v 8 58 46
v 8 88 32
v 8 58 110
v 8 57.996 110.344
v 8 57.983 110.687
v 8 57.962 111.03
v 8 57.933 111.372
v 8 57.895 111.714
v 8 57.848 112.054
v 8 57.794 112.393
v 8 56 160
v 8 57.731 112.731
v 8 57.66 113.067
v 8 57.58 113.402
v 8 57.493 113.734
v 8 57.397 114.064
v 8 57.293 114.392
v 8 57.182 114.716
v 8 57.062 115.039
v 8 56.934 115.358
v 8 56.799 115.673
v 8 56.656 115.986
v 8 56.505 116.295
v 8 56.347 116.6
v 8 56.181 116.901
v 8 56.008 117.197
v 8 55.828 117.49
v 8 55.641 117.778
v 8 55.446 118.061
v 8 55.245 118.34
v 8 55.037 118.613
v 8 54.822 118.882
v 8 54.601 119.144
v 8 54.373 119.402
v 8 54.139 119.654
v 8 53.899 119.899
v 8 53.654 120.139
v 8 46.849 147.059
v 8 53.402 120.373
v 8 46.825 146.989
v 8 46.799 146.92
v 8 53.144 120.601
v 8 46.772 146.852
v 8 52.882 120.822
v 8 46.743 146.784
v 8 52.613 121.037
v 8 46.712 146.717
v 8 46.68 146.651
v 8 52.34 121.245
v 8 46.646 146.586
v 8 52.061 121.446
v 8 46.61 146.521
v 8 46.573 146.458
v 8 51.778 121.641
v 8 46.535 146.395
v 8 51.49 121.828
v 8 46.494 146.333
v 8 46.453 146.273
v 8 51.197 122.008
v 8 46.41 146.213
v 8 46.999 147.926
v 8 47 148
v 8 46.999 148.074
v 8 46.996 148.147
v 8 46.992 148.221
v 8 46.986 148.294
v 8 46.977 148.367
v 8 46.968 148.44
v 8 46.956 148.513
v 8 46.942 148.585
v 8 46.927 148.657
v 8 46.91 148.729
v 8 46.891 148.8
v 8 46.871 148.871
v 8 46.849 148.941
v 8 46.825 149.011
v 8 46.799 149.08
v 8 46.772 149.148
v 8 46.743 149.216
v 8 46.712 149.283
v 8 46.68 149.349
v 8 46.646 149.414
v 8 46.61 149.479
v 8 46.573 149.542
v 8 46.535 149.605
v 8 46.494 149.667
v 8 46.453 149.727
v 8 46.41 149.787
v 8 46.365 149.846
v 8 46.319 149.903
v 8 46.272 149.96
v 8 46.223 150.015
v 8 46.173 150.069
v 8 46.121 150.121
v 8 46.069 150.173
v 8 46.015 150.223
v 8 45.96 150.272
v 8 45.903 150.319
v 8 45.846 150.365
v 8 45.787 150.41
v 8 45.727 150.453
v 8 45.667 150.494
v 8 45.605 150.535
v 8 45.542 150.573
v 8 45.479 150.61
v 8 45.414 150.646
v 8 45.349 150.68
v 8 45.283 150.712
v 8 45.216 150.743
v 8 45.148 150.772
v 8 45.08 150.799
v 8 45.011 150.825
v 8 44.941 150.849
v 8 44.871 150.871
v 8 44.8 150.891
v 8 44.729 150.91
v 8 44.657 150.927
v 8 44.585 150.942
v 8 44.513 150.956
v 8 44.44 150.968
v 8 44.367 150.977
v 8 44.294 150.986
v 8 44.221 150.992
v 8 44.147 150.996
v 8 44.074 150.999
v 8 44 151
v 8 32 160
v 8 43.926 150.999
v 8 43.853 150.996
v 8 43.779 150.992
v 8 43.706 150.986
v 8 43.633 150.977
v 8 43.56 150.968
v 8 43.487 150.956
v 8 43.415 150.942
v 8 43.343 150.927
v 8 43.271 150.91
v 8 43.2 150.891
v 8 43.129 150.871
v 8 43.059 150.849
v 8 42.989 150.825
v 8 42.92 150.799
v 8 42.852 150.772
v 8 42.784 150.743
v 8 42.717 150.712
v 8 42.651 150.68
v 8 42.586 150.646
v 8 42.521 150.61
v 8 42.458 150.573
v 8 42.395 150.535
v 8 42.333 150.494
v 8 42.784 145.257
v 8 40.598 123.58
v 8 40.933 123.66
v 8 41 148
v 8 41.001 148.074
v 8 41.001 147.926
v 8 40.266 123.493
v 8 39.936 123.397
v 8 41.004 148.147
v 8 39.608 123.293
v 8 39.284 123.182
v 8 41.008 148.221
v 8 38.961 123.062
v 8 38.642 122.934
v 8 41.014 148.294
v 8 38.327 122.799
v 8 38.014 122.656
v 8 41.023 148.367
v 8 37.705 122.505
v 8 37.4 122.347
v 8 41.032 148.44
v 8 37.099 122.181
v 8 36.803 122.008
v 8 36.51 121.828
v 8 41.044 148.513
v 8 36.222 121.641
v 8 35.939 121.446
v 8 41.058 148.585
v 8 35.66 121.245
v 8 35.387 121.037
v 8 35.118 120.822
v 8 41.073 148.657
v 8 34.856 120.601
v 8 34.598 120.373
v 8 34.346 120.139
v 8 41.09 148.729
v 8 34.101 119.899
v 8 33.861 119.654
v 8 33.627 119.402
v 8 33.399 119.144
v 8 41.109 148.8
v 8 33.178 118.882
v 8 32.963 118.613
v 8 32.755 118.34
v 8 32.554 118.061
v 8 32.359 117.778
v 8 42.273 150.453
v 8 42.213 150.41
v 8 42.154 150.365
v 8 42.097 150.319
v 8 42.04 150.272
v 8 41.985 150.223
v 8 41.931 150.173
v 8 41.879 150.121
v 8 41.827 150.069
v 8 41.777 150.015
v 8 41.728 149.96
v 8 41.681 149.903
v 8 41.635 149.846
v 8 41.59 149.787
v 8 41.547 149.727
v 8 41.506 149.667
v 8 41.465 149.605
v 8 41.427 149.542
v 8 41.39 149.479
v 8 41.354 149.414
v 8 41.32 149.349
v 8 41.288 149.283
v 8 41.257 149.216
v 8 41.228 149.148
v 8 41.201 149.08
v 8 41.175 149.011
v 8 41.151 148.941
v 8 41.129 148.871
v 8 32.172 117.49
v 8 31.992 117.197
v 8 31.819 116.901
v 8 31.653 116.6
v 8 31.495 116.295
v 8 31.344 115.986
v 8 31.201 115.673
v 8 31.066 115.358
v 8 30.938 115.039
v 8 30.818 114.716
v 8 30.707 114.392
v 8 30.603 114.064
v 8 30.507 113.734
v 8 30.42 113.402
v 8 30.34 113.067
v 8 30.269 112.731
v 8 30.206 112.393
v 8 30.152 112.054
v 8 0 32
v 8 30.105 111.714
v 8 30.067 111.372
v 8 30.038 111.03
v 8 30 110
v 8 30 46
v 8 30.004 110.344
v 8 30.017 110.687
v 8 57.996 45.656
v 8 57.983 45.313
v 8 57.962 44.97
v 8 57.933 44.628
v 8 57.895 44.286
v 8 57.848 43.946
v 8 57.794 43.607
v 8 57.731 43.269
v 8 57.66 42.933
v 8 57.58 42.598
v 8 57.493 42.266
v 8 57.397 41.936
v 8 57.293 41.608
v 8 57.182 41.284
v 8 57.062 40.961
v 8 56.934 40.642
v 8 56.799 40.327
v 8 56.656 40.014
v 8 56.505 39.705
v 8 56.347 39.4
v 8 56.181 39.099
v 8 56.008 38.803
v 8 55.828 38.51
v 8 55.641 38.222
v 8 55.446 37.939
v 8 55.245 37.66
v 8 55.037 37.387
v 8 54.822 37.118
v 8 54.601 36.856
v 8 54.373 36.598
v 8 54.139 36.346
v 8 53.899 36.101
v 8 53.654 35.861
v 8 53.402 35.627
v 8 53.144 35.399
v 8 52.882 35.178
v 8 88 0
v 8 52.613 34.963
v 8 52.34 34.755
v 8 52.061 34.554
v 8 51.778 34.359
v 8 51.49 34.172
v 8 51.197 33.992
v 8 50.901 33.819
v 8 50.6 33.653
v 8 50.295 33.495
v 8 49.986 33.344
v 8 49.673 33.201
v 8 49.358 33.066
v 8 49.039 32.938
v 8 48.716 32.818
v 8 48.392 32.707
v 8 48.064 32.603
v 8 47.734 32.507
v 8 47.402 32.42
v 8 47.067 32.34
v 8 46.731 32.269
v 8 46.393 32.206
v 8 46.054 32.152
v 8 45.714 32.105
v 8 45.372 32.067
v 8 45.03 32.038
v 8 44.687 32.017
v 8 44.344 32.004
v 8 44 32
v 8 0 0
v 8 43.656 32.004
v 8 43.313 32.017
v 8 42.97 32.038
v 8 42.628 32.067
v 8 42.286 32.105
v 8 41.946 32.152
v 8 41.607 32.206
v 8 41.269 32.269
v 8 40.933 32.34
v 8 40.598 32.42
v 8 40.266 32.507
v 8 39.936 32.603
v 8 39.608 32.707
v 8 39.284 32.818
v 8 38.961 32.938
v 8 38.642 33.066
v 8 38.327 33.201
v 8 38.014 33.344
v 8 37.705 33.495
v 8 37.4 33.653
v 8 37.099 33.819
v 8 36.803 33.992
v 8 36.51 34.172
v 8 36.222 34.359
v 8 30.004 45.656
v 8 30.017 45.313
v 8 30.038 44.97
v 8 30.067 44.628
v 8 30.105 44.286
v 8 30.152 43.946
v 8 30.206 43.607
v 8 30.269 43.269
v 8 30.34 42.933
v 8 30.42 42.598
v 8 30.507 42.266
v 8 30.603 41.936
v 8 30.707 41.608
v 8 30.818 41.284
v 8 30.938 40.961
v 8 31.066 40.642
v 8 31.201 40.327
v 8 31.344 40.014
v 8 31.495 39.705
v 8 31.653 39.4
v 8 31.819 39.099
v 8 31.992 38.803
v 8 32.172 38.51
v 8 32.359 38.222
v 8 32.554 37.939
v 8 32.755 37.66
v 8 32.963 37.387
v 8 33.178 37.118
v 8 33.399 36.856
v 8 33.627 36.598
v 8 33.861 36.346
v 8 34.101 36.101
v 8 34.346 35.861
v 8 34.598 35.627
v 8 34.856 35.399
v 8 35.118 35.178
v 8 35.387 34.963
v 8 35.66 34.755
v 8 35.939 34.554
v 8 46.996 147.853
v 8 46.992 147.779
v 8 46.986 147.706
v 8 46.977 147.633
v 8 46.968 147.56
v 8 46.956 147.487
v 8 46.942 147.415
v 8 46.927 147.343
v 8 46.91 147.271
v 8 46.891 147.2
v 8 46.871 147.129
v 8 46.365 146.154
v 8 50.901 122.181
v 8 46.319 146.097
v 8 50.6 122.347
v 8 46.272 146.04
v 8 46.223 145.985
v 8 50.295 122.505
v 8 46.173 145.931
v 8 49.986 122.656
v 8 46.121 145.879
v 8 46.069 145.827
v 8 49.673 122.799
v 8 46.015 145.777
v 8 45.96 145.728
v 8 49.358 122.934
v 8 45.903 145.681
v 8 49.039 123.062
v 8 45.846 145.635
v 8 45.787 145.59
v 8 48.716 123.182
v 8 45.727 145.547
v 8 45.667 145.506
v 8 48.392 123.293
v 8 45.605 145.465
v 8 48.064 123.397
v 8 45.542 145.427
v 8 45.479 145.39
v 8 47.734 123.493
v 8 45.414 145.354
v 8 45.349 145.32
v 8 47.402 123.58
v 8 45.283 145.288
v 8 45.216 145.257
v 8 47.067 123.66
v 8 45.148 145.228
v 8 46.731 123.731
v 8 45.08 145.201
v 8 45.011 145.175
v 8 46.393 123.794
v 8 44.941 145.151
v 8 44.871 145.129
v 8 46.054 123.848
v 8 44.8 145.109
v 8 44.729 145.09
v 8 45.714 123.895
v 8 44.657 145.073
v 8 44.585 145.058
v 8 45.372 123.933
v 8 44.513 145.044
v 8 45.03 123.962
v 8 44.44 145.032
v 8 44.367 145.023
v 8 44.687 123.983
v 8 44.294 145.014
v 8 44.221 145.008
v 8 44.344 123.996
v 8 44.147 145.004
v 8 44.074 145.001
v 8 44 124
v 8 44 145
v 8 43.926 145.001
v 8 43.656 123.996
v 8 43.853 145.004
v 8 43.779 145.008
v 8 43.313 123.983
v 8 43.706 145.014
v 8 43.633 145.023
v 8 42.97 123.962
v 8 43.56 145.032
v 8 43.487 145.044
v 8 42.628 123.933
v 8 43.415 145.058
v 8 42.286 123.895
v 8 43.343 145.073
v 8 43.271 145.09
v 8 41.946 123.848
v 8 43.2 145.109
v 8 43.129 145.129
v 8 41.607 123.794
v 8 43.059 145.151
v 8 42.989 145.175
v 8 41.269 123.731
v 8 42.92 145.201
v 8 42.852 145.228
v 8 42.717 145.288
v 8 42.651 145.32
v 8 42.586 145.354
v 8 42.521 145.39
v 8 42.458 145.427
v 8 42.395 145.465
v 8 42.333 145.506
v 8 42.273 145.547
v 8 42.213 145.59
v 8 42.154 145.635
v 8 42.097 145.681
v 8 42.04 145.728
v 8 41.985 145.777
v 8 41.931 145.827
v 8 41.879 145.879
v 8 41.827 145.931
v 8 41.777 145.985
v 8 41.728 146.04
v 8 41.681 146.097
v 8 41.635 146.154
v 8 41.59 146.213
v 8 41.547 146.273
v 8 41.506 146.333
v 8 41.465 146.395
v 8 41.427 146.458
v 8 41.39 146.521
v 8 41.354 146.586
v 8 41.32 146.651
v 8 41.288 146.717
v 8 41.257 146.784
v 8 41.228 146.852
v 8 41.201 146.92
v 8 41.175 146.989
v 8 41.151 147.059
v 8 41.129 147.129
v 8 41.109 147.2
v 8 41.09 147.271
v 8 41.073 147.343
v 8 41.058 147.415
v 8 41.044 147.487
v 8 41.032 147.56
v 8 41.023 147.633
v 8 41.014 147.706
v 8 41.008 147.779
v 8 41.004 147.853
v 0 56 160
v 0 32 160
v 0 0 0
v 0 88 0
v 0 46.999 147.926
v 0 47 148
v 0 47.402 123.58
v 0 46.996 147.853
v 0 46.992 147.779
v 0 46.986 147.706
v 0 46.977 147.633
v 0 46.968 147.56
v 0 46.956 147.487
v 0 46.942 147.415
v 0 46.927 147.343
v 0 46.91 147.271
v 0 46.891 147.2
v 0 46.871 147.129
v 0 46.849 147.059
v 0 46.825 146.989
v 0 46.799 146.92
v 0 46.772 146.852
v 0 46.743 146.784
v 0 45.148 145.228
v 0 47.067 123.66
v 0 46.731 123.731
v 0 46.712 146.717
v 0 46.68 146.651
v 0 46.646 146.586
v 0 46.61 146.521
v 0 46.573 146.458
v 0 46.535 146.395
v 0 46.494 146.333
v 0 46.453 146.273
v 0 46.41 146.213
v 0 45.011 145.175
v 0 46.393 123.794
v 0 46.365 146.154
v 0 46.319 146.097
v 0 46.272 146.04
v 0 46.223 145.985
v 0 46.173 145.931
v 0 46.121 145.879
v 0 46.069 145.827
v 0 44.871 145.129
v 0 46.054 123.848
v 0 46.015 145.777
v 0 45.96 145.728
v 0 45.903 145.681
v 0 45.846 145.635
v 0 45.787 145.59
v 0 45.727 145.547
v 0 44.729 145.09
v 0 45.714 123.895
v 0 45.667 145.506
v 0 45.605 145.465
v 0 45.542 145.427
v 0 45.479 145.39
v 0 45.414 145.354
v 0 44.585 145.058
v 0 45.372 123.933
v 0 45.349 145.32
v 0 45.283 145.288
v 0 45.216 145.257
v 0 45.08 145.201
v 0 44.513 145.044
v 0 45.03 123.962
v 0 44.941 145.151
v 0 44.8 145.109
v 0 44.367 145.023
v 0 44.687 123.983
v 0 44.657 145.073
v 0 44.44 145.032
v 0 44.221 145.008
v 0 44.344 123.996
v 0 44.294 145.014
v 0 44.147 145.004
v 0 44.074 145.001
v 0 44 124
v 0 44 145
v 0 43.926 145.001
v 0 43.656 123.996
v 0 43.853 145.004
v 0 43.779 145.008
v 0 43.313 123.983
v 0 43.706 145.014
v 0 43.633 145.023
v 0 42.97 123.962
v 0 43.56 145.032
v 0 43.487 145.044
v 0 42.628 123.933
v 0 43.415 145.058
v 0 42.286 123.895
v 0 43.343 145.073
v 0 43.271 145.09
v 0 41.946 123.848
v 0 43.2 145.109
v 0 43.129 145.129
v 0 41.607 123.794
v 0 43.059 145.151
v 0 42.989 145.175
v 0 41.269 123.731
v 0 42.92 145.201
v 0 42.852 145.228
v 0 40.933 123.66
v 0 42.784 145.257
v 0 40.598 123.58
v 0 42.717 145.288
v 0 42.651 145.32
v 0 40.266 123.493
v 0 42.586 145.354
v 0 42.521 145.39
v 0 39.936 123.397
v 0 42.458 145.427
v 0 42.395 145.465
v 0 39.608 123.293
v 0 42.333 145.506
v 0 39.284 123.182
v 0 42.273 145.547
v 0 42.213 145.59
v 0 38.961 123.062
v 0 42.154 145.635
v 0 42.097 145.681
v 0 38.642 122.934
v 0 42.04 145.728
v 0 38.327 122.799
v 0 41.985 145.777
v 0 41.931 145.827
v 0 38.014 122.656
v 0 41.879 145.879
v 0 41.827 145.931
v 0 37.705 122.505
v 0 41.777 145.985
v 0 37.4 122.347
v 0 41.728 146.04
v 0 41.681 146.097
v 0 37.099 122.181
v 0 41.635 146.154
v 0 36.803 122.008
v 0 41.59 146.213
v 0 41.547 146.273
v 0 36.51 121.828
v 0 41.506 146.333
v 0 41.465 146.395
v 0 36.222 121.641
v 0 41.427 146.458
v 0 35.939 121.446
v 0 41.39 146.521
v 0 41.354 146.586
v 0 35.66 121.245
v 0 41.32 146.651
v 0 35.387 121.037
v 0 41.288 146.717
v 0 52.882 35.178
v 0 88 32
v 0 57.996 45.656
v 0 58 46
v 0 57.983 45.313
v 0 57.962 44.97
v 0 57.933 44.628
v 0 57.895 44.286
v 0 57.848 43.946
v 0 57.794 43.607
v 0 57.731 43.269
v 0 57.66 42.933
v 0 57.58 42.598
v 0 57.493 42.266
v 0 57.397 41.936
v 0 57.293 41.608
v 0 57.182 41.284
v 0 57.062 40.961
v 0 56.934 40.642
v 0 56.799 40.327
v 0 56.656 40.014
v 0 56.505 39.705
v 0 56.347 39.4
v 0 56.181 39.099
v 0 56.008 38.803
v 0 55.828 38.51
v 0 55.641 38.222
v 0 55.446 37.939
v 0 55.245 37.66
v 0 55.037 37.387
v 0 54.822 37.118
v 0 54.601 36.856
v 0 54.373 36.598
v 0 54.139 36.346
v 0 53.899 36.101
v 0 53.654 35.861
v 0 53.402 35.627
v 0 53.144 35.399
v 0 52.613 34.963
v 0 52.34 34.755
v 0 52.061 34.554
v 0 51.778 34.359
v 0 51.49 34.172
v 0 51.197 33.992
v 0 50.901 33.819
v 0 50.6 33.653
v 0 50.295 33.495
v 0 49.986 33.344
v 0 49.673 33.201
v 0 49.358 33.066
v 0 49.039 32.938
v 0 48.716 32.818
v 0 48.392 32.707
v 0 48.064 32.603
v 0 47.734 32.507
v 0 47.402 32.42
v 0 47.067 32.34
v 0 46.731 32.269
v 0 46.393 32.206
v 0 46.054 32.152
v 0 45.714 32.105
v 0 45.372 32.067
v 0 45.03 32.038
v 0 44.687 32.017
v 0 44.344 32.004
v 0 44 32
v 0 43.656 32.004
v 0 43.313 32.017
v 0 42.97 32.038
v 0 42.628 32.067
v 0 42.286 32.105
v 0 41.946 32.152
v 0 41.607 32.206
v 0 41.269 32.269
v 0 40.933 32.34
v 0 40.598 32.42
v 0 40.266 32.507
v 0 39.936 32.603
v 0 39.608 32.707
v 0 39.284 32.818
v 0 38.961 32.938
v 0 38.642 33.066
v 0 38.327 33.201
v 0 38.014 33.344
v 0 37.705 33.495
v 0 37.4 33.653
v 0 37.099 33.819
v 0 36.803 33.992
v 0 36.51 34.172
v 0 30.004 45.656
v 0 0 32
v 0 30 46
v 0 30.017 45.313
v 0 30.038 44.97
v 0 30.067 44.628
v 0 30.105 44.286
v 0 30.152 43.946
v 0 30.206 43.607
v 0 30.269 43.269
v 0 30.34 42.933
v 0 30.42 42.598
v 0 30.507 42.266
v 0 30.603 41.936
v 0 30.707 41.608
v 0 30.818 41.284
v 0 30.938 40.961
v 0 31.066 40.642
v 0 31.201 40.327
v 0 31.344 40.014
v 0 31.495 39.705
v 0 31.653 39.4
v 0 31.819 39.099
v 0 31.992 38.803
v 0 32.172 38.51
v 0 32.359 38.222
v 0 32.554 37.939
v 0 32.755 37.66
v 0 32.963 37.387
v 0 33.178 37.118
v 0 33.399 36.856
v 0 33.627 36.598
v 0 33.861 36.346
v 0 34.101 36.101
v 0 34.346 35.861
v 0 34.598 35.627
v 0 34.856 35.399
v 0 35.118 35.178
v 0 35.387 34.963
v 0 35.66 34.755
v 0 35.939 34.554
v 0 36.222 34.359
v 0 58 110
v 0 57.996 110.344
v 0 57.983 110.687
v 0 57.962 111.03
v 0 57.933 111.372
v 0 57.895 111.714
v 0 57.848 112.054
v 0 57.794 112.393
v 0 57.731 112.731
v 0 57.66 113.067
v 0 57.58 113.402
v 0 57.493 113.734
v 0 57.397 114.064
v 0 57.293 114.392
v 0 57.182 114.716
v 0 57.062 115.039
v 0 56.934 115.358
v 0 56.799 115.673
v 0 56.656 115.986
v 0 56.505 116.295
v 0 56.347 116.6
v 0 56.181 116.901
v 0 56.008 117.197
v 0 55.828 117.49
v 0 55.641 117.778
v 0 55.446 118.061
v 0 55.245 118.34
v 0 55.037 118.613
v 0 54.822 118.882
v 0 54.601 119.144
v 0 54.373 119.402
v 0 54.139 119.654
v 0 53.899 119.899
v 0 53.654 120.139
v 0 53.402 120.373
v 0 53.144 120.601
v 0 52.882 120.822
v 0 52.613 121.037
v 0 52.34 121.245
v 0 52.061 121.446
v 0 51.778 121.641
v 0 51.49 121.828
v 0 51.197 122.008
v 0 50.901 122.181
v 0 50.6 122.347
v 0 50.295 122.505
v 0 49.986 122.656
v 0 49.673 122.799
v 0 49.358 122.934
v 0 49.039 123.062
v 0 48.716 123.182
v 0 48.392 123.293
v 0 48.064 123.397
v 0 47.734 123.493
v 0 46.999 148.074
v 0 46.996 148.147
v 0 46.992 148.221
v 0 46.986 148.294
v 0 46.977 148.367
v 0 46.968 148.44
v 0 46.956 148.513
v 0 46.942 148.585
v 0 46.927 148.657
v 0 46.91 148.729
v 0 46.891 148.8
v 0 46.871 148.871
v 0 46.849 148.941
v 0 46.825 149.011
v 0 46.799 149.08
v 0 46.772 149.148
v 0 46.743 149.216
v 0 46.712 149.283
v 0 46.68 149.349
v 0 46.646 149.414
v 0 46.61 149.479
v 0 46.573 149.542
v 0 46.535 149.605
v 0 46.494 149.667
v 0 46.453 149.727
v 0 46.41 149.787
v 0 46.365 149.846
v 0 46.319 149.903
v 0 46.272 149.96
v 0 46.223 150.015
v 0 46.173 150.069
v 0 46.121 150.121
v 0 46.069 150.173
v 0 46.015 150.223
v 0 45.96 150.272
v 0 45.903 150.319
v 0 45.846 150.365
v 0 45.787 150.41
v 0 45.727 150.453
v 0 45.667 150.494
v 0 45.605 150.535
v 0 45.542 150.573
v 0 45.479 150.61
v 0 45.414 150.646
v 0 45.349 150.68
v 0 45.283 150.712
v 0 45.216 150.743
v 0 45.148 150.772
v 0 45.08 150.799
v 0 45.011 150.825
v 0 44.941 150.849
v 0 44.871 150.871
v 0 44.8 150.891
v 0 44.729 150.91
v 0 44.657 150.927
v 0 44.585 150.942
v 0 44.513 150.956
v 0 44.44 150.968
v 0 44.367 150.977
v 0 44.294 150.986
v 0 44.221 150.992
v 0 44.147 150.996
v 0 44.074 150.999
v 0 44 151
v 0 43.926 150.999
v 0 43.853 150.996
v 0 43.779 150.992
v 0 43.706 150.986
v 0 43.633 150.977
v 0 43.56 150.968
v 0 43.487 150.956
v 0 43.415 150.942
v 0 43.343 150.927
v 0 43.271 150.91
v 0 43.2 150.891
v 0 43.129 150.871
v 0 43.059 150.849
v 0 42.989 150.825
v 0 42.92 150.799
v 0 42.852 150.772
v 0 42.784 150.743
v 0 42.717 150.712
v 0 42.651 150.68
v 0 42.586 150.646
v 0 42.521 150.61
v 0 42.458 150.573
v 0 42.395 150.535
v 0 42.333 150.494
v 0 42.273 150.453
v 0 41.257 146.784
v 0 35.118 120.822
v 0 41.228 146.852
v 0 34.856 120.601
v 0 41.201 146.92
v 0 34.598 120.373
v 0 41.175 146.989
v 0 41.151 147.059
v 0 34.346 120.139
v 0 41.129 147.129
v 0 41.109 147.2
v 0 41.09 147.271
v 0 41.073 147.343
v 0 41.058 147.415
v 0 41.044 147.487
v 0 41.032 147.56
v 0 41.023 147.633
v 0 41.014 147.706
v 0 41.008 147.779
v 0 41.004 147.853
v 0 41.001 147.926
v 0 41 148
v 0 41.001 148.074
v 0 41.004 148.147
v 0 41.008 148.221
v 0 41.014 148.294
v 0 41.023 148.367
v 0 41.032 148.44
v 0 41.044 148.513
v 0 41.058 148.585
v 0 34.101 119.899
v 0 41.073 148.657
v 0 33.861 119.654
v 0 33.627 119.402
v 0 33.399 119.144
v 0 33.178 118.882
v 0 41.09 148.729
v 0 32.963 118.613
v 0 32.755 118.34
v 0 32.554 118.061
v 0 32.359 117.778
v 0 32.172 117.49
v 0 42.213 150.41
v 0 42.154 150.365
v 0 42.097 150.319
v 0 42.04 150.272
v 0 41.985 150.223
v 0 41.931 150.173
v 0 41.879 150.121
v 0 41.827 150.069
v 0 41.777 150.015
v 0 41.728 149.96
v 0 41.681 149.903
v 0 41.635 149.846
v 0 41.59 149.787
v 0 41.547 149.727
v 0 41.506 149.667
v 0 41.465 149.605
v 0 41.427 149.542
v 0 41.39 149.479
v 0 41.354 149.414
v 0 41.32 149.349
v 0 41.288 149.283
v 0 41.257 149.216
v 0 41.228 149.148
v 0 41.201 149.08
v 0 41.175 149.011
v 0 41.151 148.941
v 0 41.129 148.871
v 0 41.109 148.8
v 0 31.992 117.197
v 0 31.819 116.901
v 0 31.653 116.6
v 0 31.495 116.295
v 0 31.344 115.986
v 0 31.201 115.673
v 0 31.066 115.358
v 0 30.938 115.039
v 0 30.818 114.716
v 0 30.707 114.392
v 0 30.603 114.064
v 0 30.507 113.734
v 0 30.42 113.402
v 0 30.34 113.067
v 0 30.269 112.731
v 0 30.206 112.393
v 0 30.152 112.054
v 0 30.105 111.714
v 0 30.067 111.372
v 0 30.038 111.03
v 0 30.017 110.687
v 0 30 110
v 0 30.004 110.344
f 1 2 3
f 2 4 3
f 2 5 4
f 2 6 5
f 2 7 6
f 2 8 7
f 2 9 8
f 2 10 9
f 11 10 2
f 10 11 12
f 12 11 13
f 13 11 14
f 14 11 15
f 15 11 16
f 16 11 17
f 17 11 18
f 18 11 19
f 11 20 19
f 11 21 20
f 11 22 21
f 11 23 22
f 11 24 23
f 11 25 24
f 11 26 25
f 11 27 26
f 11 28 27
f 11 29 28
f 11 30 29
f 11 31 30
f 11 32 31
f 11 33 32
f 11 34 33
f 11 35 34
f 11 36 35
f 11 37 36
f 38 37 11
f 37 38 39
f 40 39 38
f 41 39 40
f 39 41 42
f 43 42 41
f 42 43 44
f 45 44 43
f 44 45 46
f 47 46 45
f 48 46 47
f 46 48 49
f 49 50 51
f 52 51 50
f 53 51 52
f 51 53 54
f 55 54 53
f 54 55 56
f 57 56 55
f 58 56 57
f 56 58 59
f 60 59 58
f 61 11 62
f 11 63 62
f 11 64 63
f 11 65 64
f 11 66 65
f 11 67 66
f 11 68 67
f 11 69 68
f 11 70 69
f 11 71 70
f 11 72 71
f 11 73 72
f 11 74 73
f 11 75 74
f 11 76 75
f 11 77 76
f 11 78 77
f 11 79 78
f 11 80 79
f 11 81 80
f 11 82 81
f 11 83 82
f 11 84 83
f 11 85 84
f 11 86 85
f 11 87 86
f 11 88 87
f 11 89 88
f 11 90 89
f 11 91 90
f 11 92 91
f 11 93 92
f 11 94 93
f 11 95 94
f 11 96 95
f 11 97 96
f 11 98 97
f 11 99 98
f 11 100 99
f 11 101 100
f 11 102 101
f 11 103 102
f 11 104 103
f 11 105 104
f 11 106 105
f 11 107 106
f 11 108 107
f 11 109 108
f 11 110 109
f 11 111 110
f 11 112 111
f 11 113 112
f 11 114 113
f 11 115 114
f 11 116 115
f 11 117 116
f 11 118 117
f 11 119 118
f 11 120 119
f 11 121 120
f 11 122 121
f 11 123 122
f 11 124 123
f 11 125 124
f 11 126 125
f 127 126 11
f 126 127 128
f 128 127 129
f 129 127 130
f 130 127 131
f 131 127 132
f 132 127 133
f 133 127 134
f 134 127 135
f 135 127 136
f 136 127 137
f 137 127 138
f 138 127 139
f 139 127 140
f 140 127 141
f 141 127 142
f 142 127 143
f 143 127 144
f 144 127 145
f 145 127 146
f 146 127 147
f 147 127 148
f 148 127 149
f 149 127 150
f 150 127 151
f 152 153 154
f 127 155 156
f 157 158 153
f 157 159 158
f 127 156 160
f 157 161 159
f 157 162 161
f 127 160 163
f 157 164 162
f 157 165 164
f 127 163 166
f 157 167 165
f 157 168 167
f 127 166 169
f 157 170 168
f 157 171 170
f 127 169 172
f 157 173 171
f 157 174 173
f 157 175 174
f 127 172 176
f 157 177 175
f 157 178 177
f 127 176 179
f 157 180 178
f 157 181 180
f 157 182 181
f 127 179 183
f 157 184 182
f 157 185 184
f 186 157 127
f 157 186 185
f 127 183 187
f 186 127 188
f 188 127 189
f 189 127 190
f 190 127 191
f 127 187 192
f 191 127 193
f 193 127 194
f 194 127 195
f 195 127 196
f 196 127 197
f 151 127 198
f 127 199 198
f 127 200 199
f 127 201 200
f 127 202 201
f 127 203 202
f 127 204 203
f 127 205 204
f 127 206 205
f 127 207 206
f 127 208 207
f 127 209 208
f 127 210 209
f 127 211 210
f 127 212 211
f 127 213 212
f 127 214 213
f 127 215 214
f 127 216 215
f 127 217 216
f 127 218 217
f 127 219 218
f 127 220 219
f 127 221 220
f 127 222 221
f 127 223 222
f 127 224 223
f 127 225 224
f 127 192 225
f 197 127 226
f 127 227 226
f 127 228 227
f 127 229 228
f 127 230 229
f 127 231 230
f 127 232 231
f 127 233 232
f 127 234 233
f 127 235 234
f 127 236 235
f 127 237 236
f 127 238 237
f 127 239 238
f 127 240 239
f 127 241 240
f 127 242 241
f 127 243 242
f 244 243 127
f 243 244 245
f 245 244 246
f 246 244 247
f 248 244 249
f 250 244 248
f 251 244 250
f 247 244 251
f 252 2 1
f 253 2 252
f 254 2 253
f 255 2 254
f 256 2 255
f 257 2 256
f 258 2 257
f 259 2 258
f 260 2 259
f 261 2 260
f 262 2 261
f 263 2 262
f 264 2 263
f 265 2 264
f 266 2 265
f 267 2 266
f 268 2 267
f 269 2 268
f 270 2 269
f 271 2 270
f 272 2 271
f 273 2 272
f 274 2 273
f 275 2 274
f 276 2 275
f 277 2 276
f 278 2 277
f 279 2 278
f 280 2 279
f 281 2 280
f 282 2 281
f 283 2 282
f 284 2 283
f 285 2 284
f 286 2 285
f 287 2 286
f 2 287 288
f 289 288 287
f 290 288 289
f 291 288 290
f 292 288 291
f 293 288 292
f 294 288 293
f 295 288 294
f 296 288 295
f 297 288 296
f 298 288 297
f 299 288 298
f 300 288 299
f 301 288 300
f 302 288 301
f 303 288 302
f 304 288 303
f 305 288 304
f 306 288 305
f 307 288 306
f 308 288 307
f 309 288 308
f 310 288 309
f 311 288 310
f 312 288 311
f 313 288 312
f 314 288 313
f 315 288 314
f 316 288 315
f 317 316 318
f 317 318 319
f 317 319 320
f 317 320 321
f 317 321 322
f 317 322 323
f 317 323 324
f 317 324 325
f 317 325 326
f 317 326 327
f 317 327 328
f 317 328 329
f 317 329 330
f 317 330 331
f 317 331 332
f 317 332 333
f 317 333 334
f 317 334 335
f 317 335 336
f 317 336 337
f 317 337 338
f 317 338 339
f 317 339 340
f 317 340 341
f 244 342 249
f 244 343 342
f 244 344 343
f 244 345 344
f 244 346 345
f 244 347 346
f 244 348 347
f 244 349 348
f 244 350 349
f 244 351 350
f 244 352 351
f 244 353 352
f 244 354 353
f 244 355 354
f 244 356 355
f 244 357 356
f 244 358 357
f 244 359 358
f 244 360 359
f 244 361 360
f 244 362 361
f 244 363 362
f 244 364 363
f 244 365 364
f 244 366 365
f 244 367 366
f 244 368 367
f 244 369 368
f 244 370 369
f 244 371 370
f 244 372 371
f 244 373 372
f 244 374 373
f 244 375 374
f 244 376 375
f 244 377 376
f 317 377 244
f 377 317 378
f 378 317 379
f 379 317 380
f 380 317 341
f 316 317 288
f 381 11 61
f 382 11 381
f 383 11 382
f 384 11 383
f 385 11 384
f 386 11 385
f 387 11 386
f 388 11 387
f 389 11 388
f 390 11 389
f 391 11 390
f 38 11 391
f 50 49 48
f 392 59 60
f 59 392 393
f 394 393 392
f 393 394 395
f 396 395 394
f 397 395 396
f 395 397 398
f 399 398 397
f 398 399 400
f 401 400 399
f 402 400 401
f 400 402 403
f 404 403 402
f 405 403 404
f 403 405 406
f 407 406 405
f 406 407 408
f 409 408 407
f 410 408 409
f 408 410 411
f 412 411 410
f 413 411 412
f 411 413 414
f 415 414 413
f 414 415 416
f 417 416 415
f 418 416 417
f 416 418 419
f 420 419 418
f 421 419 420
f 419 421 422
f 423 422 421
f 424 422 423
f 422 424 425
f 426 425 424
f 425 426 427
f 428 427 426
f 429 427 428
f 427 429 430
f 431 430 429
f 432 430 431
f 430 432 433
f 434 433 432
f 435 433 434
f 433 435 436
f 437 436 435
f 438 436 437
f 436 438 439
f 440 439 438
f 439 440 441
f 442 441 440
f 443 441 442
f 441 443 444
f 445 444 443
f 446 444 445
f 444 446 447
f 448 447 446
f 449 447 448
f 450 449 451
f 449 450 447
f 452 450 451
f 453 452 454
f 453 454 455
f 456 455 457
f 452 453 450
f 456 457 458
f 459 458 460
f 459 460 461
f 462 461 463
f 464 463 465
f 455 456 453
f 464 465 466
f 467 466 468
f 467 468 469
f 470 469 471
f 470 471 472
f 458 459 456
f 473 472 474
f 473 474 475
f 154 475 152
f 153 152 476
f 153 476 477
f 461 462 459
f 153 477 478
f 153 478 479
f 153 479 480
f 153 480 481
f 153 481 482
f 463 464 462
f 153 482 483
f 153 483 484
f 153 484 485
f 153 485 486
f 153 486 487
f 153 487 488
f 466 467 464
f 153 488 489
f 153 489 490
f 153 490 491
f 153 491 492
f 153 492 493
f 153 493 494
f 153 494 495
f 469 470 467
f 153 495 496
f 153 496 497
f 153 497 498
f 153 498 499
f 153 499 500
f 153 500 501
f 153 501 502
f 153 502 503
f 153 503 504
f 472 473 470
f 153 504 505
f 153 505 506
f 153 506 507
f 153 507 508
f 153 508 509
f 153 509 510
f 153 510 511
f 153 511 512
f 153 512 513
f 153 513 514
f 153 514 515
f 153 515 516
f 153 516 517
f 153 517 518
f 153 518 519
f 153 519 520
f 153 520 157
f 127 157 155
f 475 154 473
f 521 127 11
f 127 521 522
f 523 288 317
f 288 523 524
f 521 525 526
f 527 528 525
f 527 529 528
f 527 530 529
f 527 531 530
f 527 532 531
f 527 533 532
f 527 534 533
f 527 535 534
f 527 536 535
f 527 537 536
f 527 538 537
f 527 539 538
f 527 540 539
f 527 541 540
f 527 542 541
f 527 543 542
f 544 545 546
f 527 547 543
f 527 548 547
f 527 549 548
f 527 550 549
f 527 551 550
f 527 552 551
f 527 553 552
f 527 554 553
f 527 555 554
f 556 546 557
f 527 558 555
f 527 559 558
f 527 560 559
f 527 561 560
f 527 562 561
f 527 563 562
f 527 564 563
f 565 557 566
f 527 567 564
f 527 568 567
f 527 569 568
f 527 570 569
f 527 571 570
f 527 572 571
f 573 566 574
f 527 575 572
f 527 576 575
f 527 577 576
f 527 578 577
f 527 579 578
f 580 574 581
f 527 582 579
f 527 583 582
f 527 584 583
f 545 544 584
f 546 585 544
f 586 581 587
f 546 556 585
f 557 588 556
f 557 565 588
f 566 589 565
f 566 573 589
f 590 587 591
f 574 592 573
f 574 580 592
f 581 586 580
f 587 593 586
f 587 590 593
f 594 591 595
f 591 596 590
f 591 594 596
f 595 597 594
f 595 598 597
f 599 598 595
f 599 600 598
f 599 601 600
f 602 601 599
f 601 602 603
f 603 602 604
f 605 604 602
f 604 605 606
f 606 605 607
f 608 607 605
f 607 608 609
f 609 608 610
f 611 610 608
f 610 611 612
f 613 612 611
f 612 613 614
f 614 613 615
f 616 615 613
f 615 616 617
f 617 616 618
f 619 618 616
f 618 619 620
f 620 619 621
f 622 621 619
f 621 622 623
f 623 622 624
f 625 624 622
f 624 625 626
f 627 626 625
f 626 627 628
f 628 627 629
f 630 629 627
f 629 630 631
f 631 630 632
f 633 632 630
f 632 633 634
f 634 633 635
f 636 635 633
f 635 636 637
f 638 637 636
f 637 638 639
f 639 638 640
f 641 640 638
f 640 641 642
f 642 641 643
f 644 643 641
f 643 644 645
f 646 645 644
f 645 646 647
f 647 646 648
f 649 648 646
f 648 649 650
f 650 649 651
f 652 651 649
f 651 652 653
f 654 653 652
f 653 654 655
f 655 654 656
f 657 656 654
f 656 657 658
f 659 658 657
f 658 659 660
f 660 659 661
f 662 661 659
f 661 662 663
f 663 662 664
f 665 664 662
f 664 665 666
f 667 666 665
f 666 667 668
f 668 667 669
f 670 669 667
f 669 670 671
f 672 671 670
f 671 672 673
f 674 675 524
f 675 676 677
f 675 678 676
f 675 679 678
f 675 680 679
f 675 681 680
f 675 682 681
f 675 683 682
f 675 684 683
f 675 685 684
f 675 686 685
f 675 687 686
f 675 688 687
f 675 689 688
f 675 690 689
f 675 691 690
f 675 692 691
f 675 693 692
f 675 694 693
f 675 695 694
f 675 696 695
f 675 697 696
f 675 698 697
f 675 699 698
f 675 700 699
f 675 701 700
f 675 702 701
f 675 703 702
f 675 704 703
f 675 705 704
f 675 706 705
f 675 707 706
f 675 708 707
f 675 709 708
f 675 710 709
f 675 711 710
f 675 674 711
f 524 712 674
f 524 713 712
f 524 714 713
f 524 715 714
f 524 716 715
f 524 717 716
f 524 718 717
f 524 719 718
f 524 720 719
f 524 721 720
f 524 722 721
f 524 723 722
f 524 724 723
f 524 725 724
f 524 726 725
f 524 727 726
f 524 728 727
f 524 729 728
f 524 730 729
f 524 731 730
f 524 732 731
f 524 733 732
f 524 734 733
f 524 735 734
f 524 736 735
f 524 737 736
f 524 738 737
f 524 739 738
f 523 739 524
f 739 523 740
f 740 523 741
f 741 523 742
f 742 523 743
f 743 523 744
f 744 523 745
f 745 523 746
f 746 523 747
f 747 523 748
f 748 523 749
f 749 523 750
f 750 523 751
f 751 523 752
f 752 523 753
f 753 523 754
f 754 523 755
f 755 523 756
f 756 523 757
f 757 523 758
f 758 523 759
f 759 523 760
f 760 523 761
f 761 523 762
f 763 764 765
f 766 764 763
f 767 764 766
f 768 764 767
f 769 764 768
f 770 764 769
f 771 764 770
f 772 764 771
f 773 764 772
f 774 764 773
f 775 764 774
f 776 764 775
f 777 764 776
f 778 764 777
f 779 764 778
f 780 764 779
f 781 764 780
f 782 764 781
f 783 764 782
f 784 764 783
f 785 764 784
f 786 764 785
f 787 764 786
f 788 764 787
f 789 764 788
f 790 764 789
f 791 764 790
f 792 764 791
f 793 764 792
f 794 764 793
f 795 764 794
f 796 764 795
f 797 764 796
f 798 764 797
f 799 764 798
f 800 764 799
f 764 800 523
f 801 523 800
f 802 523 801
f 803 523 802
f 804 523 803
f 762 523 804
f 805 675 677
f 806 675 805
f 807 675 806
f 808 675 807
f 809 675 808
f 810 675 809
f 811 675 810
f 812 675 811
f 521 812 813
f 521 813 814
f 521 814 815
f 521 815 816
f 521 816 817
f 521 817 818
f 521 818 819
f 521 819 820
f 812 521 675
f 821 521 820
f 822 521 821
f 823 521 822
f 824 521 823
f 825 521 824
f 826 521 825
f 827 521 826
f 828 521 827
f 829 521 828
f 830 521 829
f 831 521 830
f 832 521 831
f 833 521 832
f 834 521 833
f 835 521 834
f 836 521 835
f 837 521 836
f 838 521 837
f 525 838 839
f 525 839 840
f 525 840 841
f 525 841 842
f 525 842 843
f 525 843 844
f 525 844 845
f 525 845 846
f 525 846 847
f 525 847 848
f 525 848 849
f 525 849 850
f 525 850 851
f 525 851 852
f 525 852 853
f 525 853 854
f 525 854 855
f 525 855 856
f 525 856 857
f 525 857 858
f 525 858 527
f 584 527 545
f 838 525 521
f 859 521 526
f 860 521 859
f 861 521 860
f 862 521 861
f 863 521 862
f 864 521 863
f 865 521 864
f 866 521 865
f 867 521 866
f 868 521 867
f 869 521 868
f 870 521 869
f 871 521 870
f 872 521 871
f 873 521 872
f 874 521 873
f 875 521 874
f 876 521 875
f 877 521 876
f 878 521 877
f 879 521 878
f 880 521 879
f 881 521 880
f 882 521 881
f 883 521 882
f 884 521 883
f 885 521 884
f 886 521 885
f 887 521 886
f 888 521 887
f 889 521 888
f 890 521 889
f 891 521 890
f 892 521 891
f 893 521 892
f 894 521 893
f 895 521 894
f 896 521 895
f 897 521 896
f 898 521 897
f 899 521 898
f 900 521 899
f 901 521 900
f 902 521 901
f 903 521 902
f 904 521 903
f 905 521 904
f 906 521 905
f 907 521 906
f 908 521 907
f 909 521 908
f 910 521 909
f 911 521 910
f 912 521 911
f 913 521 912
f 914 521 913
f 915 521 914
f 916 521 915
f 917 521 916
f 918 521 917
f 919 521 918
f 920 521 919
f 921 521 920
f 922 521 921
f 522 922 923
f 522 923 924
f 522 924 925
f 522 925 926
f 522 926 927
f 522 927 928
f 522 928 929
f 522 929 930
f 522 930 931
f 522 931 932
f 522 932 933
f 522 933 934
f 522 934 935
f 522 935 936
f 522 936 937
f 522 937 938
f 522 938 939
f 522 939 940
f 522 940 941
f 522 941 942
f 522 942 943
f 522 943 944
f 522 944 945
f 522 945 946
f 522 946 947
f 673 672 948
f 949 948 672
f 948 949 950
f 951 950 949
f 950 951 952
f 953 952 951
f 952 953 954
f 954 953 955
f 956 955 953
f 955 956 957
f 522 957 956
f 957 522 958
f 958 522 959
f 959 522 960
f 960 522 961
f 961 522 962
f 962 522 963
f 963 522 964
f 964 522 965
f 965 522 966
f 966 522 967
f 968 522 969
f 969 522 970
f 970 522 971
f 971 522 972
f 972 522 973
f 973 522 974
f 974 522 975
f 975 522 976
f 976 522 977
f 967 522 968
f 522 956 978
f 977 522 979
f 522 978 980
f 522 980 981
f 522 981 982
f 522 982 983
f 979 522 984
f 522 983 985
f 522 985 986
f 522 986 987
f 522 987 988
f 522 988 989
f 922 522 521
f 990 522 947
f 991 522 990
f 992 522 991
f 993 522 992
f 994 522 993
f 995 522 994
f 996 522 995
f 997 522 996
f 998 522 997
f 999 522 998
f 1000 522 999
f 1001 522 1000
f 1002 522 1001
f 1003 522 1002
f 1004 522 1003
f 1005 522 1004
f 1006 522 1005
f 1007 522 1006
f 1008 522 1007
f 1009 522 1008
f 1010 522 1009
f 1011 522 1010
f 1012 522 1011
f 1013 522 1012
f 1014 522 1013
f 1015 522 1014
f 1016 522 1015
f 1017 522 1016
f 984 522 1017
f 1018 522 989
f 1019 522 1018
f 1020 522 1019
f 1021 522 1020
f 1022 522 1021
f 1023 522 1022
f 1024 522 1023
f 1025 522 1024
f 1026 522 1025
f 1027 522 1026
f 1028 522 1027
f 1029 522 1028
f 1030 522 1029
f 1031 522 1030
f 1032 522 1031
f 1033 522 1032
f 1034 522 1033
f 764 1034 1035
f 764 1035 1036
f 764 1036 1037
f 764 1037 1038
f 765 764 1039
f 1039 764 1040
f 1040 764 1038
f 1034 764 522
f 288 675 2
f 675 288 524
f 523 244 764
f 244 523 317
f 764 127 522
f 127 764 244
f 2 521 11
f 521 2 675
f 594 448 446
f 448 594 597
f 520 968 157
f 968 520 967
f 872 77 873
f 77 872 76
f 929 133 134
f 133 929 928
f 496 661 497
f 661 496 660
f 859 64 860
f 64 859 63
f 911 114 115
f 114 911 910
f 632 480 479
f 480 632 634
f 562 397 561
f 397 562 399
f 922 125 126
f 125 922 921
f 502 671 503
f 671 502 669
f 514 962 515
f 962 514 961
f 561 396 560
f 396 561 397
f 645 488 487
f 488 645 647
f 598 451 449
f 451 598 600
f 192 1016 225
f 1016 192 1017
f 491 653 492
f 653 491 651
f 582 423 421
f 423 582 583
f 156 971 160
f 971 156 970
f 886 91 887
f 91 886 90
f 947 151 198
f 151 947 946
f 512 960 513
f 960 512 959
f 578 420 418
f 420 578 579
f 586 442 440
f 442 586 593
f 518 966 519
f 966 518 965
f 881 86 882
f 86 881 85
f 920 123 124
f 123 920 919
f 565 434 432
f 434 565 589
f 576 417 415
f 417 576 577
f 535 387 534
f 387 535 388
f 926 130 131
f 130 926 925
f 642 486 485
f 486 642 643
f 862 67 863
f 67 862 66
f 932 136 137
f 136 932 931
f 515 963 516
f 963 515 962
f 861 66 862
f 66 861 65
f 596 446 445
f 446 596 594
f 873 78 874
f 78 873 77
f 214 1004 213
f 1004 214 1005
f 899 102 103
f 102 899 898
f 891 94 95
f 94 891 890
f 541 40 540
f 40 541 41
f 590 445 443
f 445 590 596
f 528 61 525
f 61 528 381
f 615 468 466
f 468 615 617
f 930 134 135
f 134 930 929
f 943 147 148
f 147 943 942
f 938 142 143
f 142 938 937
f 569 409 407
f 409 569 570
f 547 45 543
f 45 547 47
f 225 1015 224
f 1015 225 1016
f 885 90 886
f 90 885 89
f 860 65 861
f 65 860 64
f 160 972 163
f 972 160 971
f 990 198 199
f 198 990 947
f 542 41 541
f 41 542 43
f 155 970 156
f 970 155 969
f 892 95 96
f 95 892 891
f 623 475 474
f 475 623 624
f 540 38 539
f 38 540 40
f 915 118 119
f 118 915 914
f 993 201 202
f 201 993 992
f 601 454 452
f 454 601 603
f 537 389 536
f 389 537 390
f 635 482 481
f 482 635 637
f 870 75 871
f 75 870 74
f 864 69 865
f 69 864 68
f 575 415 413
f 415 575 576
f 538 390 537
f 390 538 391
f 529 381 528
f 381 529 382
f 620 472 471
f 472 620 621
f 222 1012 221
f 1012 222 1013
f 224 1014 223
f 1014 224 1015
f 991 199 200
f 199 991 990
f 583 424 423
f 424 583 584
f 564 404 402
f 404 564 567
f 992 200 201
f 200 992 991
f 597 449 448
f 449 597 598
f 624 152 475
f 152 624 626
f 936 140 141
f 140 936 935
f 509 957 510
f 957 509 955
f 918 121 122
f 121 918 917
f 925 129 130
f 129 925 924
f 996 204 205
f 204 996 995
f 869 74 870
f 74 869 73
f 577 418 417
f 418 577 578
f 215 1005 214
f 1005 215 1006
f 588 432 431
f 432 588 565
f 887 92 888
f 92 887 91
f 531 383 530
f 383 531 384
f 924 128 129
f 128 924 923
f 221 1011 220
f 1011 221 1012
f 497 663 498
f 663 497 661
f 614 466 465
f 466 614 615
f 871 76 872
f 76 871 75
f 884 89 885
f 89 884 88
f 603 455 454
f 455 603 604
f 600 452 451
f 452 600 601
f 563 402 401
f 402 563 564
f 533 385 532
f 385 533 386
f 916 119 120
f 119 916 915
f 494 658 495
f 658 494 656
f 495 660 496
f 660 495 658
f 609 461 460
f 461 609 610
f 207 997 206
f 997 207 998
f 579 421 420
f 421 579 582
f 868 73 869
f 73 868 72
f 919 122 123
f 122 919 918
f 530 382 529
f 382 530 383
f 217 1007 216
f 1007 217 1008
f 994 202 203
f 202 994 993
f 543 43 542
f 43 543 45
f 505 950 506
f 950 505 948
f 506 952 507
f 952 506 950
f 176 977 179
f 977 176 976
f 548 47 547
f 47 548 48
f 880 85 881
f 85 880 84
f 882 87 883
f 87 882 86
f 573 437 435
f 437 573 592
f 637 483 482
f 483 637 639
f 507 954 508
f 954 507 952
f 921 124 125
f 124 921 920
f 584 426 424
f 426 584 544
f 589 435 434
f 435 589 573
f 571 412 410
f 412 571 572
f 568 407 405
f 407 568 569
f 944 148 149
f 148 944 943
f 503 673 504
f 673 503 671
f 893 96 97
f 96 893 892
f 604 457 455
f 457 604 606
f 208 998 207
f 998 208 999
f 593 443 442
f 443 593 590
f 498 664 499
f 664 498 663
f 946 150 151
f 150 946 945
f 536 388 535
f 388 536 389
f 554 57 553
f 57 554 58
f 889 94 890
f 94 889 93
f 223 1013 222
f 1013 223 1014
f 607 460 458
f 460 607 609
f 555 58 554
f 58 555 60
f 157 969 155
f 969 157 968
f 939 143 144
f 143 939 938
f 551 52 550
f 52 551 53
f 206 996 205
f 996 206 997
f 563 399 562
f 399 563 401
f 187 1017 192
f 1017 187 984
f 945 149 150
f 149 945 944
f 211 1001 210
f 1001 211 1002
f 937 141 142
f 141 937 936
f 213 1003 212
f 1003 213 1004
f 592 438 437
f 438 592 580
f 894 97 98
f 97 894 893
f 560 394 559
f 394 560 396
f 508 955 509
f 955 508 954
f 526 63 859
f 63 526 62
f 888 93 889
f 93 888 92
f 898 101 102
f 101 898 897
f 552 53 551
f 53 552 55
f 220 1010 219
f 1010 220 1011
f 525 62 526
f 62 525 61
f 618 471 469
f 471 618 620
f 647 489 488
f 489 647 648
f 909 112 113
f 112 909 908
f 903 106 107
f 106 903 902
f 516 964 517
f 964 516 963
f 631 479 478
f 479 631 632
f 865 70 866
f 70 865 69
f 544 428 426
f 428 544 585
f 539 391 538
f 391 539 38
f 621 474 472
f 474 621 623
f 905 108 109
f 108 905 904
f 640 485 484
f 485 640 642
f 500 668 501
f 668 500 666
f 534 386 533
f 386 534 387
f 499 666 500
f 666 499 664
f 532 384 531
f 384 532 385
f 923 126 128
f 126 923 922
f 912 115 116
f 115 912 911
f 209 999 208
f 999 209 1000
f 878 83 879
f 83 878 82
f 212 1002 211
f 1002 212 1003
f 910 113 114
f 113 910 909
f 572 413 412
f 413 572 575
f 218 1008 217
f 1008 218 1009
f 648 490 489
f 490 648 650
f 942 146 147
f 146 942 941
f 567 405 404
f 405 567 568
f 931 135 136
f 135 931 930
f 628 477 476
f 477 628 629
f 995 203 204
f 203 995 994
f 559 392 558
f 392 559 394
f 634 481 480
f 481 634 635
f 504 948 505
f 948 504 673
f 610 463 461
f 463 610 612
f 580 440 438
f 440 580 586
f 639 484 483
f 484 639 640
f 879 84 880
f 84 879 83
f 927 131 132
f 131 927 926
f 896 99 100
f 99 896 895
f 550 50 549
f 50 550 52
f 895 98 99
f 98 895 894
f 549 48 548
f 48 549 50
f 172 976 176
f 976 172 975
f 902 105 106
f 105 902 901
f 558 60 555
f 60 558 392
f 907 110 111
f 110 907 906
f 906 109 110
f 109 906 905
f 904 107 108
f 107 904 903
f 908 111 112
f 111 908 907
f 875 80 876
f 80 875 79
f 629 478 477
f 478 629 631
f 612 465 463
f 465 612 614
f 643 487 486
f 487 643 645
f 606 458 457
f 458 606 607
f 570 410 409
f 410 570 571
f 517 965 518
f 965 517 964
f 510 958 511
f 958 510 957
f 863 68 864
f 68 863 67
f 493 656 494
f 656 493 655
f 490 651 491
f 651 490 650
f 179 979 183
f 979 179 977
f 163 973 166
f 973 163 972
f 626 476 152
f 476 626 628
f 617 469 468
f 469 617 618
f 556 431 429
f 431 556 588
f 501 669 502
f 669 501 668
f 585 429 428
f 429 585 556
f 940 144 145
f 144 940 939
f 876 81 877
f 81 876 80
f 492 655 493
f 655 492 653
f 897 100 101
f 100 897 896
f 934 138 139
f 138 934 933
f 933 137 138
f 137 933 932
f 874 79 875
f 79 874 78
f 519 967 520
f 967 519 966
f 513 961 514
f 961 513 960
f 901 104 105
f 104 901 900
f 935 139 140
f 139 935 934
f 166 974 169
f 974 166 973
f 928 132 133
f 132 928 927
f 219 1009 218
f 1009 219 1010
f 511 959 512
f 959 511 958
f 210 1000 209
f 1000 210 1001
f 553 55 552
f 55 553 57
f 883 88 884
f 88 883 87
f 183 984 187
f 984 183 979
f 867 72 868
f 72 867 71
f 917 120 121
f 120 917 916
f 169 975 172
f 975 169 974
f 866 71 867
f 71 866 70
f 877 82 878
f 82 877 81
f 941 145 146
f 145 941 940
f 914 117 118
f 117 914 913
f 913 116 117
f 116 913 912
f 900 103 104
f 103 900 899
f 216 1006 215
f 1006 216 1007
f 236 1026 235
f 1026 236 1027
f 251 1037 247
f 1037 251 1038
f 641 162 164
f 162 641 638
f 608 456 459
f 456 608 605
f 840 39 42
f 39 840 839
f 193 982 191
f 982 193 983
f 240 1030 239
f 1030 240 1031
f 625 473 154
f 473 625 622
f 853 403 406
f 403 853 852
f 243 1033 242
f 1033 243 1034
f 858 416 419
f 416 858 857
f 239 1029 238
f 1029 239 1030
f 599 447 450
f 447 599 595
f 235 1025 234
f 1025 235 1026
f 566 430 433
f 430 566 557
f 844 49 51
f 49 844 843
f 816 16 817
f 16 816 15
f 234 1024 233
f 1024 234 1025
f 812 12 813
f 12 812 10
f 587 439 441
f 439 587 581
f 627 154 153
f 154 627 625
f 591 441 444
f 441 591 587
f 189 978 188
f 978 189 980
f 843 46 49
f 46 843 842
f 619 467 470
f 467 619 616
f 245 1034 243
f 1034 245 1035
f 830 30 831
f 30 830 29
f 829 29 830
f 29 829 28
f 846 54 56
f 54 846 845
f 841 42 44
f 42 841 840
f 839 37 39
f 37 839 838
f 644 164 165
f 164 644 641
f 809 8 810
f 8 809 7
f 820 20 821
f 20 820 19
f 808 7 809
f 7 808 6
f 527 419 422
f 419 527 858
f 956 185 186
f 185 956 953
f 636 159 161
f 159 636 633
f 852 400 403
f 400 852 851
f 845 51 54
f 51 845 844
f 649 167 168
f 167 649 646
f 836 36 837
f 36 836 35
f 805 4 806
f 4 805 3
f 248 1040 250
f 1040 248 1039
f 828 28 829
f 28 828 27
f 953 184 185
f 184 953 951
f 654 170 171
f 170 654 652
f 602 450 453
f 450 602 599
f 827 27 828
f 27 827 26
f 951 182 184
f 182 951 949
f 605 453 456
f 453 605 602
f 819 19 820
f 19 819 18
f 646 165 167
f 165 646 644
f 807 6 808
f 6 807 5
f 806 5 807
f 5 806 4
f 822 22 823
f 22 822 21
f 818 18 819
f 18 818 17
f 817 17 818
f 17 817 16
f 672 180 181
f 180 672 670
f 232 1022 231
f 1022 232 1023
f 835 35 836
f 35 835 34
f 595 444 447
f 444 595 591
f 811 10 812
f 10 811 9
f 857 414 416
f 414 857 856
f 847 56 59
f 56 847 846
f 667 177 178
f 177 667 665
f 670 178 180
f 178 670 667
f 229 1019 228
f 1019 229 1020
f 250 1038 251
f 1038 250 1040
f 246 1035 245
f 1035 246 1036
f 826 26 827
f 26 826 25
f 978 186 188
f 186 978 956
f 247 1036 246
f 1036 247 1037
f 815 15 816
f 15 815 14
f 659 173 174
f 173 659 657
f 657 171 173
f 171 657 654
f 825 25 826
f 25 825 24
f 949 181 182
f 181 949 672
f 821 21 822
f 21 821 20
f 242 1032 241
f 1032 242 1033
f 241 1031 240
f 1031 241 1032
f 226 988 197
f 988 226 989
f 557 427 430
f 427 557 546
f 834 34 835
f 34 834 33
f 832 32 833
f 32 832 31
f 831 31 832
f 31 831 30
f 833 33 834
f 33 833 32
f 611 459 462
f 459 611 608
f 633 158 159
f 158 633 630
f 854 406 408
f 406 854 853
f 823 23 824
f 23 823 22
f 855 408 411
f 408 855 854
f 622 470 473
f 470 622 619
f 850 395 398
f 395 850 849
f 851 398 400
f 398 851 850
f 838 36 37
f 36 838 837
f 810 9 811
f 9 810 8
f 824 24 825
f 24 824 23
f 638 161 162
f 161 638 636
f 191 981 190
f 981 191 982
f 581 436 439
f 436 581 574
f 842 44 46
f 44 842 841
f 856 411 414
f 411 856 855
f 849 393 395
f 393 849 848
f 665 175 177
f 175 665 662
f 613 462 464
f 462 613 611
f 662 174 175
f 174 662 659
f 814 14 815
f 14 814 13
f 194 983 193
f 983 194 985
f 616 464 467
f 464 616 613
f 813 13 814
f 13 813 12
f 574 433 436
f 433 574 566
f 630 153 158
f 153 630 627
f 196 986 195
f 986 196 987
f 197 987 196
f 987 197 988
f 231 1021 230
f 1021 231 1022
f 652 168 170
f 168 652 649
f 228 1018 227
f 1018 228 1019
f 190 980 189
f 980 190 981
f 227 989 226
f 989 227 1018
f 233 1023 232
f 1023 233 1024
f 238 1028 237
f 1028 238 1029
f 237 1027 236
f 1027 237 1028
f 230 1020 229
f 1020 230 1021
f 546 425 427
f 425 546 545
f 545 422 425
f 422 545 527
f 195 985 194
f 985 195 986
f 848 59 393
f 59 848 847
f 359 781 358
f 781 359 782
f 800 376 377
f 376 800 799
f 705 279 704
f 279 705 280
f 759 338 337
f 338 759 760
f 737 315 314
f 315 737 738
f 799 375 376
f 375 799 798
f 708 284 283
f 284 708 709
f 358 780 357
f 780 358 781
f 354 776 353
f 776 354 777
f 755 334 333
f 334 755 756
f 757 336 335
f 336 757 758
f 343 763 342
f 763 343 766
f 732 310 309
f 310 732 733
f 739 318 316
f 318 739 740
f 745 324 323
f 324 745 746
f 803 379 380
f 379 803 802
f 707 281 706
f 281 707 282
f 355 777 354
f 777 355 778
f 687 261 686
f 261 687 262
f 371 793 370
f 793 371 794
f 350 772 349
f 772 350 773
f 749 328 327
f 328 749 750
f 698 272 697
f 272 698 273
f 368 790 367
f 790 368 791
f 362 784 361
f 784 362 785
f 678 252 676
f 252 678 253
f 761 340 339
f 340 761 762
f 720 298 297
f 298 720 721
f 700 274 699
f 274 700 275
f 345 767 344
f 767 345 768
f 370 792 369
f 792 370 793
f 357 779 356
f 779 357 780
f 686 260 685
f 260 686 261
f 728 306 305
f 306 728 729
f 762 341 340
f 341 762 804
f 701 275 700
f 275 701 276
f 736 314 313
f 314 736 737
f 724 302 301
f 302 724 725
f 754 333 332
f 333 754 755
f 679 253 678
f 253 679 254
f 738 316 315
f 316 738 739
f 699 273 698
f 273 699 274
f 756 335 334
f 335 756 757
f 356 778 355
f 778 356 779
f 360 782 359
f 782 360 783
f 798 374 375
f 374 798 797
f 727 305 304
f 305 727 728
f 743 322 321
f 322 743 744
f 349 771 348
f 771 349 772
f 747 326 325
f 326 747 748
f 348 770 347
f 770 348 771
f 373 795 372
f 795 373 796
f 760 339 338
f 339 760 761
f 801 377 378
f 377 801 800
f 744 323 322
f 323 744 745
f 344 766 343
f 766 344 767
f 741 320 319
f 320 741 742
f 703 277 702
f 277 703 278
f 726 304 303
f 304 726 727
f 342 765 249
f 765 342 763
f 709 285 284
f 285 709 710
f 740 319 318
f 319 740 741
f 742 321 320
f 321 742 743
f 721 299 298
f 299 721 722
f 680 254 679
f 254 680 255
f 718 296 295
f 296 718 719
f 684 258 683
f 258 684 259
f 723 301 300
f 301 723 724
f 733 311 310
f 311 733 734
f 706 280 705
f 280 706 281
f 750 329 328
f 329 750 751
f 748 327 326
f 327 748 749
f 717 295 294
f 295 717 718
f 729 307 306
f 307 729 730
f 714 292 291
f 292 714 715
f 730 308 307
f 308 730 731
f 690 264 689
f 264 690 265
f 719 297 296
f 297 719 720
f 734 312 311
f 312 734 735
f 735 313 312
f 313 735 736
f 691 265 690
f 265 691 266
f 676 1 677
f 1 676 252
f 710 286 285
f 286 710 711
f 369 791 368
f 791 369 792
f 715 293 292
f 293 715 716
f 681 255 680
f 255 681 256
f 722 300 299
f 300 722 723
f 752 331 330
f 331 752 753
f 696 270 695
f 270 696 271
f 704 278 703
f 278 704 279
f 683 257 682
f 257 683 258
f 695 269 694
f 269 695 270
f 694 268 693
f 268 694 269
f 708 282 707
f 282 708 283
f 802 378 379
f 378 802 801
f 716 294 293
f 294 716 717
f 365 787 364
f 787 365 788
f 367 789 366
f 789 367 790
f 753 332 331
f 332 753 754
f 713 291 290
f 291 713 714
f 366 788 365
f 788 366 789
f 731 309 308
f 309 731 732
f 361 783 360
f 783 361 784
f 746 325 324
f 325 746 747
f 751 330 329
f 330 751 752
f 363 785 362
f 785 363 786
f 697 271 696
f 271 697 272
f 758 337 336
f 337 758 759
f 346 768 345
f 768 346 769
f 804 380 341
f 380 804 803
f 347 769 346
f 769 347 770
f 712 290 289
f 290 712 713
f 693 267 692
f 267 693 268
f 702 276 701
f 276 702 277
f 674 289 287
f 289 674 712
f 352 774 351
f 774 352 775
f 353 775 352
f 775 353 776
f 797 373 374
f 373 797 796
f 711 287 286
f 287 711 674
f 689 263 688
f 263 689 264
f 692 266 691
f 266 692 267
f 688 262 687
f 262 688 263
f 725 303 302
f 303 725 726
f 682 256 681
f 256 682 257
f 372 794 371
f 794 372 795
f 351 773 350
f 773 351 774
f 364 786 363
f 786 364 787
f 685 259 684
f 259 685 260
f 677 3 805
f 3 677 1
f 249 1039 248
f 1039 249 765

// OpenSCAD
// edit these values to configure the mount
mount_thickness = 8;
mount_top_width = 24;
mount_bottom_width = 88;
mount_bottom_side_height = 32;
mount_height = 160;

motor_diameter = 28;
motor_offset_from_axle = 50;

axle_diameter = 6;

screw_diameter = 3.5;

// these values are calculated - do not edit

// from the documentation - how to make a triangular solid
module prism(l, w, h){
   polyhedron(
       points=[[0,0,0], [l,0,0], [l,w,0], [0,w,0], [0,w,h], [l,w,h]],
       faces=[[0,1,2,3], [5,4,3,2], [0,4,5,1], [0,3,4], [5,2,1]]
   );
}

difference() {
    // start with a big cube to subtract from
    cube(size=[mount_thickness, mount_bottom_width, mount_height], center=false);
    // lop off the top-left corner
    translate([-mount_thickness/2,(mount_bottom_width-mount_top_width)/2,mount_height])
        rotate([180,0,0])
            prism(mount_thickness*2, (mount_bottom_width-mount_top_width)/2, mount_height-mount_bottom_side_height);
    // lop off the top-right corner
    translate([mount_thickness,mount_top_width+(mount_bottom_width-mount_top_width)/2,mount_height])
        rotate([0,180,0])
            prism(mount_thickness*2, (mount_bottom_width-mount_top_width)/2, mount_height-mount_bottom_side_height);
    // punch the axle hole through
    translate([mount_thickness/2,mount_bottom_width/2,mount_height-mount_top_width/2])
        rotate([0,90,0])
            cylinder(h=mount_thickness*2, d=axle_diameter, center=true, $fn=256);
    // create space for the motor to be mounted
    translate([mount_thickness/2,mount_bottom_width/2,mount_height-motor_offset_from_axle])
        rotate([0,90,0])
            cylinder(h=mount_thickness*2, d=motor_diameter, center=true, $fn=256);
    // create space for the motor to be mounted (and to save print time)
    translate([mount_thickness/2,mount_bottom_width/2,mount_bottom_side_height+motor_diameter/2])
        rotate([0,90,0])
            cylinder(h=mount_thickness*2, d=motor_diameter, center=true, $fn=256);
    translate([-mount_thickness/2,mount_bottom_width/2-motor_diameter/2,mount_bottom_side_height+motor_diameter/2])
        cube([mount_thickness*2, motor_diameter, mount_height-motor_offset_from_axle-mount_bottom_side_height-motor_diameter/2], center=false);
}
